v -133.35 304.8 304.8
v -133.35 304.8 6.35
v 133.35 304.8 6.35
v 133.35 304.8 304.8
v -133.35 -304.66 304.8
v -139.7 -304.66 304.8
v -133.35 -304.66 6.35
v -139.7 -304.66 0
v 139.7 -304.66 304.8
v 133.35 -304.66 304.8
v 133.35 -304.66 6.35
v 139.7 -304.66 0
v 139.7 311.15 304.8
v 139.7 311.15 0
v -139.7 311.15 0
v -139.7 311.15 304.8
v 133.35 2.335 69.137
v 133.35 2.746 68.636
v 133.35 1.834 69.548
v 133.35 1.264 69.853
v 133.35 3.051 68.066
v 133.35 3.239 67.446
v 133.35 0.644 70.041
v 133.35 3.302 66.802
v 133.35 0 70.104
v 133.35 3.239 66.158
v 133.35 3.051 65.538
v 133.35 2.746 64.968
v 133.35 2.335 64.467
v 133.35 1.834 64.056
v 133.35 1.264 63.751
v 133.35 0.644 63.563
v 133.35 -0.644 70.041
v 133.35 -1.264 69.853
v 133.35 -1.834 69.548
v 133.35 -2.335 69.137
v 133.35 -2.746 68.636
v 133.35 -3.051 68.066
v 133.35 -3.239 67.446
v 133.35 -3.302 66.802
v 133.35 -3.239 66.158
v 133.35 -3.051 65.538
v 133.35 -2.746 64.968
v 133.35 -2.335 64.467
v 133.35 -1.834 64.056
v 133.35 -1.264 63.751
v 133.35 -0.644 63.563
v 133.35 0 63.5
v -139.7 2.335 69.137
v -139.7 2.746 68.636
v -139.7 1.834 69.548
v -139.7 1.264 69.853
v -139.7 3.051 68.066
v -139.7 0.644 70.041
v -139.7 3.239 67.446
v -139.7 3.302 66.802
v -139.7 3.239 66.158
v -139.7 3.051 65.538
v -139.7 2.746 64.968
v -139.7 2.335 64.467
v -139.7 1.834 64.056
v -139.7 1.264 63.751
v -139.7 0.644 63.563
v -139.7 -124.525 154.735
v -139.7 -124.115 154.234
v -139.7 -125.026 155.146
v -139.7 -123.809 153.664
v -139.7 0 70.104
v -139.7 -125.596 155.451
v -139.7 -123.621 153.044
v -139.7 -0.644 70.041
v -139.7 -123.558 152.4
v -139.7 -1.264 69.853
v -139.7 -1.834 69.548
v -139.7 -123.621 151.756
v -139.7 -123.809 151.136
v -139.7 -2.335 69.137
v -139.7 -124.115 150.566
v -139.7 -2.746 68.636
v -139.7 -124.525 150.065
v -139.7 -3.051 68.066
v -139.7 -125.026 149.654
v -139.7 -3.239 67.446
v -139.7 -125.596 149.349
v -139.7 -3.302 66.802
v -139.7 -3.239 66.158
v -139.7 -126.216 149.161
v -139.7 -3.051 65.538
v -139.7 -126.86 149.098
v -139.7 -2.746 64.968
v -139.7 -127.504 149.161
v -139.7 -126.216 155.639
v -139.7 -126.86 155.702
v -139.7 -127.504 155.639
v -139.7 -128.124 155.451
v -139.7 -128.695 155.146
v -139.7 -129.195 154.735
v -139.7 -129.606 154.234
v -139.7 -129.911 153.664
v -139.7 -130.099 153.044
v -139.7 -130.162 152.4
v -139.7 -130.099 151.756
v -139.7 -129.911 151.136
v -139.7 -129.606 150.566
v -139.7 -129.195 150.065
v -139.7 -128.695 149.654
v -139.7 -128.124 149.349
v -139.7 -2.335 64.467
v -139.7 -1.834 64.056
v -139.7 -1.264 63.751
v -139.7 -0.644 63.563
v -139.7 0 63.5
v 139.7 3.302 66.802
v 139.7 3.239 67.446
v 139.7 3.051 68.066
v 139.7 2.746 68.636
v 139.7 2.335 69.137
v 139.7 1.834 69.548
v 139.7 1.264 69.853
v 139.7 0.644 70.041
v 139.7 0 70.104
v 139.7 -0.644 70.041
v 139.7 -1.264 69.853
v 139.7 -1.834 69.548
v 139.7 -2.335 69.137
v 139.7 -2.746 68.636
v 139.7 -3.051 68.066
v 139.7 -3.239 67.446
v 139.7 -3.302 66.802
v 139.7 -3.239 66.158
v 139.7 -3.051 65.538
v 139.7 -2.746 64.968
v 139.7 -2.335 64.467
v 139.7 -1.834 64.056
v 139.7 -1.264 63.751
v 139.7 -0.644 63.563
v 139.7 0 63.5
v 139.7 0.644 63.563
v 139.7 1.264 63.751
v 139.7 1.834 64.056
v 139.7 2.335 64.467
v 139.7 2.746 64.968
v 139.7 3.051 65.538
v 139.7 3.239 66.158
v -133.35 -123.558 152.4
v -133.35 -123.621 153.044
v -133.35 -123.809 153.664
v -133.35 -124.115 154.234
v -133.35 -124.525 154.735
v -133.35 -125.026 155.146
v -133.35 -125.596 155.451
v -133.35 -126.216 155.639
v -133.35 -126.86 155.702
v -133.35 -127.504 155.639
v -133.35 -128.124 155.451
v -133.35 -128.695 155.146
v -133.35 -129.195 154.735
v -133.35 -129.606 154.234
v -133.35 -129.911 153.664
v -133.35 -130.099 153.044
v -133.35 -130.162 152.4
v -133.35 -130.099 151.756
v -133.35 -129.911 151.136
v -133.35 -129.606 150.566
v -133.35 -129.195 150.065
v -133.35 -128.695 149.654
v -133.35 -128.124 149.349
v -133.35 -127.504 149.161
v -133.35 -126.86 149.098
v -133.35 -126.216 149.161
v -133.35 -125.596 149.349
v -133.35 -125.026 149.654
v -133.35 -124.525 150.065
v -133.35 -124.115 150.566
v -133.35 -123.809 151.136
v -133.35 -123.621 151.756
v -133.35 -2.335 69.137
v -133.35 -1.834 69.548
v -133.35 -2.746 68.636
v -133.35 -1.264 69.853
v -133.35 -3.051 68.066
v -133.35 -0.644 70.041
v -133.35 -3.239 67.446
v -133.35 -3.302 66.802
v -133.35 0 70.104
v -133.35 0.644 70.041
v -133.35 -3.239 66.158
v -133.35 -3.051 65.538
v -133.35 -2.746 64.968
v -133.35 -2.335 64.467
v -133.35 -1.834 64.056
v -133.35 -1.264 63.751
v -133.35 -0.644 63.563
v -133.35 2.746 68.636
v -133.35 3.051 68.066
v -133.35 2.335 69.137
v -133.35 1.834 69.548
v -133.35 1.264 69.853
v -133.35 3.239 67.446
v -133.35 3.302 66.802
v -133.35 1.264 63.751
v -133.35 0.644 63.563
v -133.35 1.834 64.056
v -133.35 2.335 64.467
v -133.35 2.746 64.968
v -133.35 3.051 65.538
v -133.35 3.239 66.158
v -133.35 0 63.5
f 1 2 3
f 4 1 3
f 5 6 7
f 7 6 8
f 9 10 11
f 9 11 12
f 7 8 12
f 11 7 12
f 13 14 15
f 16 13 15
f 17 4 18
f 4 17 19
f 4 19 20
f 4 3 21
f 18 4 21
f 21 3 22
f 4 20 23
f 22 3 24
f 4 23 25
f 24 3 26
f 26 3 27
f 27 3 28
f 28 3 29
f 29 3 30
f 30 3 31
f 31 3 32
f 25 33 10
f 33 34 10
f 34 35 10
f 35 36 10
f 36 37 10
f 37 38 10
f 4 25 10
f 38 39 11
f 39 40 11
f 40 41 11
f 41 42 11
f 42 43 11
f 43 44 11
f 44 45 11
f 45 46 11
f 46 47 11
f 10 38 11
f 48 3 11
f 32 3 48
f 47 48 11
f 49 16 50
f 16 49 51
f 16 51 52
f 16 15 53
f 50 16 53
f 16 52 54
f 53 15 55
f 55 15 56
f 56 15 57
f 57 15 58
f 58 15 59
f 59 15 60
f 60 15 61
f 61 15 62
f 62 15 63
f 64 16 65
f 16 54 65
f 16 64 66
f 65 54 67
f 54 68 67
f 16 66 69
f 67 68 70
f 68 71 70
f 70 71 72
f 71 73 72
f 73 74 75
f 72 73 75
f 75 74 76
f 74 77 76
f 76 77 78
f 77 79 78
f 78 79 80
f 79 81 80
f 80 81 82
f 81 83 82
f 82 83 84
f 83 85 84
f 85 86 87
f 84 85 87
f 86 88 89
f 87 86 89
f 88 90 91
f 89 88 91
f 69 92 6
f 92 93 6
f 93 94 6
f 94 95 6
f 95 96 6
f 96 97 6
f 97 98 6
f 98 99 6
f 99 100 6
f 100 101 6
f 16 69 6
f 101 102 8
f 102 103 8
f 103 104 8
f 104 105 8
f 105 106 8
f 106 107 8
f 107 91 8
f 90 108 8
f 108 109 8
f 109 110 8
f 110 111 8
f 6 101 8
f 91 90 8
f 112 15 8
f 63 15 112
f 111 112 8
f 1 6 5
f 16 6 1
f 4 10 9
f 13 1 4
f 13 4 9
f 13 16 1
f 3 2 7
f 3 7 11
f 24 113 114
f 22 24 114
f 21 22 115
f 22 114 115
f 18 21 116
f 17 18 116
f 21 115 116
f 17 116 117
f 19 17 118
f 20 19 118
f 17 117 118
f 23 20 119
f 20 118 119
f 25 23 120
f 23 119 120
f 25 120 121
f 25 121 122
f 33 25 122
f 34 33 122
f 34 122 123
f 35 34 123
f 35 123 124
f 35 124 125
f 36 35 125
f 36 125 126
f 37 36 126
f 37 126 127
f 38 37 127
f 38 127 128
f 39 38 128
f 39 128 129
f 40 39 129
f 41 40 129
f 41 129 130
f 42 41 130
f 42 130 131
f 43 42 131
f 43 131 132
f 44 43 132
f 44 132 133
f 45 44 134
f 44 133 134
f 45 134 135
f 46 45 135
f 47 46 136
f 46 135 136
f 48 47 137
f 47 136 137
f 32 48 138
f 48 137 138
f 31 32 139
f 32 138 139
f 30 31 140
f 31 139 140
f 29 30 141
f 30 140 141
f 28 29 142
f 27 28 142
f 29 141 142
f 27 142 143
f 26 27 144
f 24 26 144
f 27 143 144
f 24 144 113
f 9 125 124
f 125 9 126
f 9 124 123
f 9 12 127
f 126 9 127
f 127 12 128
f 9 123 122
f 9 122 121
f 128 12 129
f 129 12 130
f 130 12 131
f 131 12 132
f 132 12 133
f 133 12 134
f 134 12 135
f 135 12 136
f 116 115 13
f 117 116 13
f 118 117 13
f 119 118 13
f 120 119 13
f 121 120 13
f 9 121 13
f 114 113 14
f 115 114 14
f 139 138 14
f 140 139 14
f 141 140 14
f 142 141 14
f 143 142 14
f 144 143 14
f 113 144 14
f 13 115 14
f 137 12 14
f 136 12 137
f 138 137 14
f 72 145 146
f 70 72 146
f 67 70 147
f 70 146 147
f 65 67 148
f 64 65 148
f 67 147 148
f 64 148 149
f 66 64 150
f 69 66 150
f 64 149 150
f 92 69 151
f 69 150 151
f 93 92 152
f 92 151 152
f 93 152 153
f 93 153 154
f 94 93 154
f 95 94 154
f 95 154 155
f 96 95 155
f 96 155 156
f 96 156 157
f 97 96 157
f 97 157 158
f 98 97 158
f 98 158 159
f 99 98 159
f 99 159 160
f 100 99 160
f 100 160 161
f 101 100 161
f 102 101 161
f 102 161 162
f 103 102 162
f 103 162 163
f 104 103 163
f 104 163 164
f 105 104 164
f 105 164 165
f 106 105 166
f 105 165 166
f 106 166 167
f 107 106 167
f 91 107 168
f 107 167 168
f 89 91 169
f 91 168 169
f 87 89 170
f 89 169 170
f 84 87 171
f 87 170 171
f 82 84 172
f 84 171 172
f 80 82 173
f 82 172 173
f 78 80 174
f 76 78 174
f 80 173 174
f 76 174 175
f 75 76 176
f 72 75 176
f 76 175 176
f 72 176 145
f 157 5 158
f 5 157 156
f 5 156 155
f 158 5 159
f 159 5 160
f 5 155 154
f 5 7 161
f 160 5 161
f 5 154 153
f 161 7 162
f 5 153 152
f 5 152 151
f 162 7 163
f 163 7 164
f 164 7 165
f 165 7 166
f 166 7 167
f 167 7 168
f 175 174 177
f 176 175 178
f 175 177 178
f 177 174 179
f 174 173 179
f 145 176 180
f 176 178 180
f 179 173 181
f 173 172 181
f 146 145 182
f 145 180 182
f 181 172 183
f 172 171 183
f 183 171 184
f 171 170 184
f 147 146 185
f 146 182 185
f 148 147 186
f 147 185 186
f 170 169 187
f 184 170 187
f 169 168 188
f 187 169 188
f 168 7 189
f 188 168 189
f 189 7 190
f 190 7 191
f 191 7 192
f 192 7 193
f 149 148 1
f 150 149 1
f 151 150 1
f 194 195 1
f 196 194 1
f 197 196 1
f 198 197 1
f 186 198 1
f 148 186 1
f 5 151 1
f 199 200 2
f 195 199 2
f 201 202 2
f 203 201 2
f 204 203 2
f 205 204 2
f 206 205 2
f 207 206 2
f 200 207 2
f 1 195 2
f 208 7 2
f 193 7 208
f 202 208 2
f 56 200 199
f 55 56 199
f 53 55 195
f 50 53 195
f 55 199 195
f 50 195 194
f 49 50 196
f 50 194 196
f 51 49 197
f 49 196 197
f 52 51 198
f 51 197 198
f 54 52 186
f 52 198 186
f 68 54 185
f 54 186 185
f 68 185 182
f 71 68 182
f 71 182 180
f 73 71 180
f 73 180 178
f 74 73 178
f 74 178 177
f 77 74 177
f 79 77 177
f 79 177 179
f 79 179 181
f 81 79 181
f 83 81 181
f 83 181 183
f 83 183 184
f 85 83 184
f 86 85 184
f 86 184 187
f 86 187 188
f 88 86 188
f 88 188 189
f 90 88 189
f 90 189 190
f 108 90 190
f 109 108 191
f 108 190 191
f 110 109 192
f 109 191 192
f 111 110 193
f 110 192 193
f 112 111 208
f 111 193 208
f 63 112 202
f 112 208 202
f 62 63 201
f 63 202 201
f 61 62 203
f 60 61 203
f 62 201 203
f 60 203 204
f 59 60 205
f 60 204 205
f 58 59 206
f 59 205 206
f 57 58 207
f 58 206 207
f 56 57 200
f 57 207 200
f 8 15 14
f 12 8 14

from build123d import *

# Parameters (mm, degrees)
F0_W     = 266.7
F0_H     = 609.4600376606
F1_DEPTH = 6.35
F2_DEPTH = 304.8
F3_R     = 3.302
F4_DEPTH = 279.401
F5_R     = 3.302
F6_DEPTH = 25.4


with BuildPart() as f1:
    # F0 (on Top) → F1 (new body)
    with BuildSketch(Plane.XY):
        with Locations((0, 0.0699811697)):
            Rectangle(F0_W, F0_H)
    extrude(amount=F1_DEPTH)

    # F0 (on Top) → F2 (join)
    with BuildSketch(Plane.XY):
        Polygon((-133.35, 304.8), (133.35, 304.8), (133.35, -304.6600376606), (139.7, -304.6600376606), (139.7, 311.15), (-139.7, 311.15), (-139.7, -304.6600376606), (-133.35, -304.6600376606), align=None)
    extrude(amount=F2_DEPTH)

    # F3 (on face) → F4 (cut, through all)
    with BuildSketch(Plane.YZ.offset(139.7)):
        with Locations((0, 66.802)):
            Circle(F3_R)
    extrude(amount=-F4_DEPTH, mode=Mode.SUBTRACT)

    # F5 (on face) → F6 (cut)
    with BuildSketch(Plane.YZ.offset(-133.35)):
        with Locations((-126.8600376606, 152.4)):
            Circle(F5_R)
    extrude(amount=-F6_DEPTH, mode=Mode.SUBTRACT)


solid = f1.part
